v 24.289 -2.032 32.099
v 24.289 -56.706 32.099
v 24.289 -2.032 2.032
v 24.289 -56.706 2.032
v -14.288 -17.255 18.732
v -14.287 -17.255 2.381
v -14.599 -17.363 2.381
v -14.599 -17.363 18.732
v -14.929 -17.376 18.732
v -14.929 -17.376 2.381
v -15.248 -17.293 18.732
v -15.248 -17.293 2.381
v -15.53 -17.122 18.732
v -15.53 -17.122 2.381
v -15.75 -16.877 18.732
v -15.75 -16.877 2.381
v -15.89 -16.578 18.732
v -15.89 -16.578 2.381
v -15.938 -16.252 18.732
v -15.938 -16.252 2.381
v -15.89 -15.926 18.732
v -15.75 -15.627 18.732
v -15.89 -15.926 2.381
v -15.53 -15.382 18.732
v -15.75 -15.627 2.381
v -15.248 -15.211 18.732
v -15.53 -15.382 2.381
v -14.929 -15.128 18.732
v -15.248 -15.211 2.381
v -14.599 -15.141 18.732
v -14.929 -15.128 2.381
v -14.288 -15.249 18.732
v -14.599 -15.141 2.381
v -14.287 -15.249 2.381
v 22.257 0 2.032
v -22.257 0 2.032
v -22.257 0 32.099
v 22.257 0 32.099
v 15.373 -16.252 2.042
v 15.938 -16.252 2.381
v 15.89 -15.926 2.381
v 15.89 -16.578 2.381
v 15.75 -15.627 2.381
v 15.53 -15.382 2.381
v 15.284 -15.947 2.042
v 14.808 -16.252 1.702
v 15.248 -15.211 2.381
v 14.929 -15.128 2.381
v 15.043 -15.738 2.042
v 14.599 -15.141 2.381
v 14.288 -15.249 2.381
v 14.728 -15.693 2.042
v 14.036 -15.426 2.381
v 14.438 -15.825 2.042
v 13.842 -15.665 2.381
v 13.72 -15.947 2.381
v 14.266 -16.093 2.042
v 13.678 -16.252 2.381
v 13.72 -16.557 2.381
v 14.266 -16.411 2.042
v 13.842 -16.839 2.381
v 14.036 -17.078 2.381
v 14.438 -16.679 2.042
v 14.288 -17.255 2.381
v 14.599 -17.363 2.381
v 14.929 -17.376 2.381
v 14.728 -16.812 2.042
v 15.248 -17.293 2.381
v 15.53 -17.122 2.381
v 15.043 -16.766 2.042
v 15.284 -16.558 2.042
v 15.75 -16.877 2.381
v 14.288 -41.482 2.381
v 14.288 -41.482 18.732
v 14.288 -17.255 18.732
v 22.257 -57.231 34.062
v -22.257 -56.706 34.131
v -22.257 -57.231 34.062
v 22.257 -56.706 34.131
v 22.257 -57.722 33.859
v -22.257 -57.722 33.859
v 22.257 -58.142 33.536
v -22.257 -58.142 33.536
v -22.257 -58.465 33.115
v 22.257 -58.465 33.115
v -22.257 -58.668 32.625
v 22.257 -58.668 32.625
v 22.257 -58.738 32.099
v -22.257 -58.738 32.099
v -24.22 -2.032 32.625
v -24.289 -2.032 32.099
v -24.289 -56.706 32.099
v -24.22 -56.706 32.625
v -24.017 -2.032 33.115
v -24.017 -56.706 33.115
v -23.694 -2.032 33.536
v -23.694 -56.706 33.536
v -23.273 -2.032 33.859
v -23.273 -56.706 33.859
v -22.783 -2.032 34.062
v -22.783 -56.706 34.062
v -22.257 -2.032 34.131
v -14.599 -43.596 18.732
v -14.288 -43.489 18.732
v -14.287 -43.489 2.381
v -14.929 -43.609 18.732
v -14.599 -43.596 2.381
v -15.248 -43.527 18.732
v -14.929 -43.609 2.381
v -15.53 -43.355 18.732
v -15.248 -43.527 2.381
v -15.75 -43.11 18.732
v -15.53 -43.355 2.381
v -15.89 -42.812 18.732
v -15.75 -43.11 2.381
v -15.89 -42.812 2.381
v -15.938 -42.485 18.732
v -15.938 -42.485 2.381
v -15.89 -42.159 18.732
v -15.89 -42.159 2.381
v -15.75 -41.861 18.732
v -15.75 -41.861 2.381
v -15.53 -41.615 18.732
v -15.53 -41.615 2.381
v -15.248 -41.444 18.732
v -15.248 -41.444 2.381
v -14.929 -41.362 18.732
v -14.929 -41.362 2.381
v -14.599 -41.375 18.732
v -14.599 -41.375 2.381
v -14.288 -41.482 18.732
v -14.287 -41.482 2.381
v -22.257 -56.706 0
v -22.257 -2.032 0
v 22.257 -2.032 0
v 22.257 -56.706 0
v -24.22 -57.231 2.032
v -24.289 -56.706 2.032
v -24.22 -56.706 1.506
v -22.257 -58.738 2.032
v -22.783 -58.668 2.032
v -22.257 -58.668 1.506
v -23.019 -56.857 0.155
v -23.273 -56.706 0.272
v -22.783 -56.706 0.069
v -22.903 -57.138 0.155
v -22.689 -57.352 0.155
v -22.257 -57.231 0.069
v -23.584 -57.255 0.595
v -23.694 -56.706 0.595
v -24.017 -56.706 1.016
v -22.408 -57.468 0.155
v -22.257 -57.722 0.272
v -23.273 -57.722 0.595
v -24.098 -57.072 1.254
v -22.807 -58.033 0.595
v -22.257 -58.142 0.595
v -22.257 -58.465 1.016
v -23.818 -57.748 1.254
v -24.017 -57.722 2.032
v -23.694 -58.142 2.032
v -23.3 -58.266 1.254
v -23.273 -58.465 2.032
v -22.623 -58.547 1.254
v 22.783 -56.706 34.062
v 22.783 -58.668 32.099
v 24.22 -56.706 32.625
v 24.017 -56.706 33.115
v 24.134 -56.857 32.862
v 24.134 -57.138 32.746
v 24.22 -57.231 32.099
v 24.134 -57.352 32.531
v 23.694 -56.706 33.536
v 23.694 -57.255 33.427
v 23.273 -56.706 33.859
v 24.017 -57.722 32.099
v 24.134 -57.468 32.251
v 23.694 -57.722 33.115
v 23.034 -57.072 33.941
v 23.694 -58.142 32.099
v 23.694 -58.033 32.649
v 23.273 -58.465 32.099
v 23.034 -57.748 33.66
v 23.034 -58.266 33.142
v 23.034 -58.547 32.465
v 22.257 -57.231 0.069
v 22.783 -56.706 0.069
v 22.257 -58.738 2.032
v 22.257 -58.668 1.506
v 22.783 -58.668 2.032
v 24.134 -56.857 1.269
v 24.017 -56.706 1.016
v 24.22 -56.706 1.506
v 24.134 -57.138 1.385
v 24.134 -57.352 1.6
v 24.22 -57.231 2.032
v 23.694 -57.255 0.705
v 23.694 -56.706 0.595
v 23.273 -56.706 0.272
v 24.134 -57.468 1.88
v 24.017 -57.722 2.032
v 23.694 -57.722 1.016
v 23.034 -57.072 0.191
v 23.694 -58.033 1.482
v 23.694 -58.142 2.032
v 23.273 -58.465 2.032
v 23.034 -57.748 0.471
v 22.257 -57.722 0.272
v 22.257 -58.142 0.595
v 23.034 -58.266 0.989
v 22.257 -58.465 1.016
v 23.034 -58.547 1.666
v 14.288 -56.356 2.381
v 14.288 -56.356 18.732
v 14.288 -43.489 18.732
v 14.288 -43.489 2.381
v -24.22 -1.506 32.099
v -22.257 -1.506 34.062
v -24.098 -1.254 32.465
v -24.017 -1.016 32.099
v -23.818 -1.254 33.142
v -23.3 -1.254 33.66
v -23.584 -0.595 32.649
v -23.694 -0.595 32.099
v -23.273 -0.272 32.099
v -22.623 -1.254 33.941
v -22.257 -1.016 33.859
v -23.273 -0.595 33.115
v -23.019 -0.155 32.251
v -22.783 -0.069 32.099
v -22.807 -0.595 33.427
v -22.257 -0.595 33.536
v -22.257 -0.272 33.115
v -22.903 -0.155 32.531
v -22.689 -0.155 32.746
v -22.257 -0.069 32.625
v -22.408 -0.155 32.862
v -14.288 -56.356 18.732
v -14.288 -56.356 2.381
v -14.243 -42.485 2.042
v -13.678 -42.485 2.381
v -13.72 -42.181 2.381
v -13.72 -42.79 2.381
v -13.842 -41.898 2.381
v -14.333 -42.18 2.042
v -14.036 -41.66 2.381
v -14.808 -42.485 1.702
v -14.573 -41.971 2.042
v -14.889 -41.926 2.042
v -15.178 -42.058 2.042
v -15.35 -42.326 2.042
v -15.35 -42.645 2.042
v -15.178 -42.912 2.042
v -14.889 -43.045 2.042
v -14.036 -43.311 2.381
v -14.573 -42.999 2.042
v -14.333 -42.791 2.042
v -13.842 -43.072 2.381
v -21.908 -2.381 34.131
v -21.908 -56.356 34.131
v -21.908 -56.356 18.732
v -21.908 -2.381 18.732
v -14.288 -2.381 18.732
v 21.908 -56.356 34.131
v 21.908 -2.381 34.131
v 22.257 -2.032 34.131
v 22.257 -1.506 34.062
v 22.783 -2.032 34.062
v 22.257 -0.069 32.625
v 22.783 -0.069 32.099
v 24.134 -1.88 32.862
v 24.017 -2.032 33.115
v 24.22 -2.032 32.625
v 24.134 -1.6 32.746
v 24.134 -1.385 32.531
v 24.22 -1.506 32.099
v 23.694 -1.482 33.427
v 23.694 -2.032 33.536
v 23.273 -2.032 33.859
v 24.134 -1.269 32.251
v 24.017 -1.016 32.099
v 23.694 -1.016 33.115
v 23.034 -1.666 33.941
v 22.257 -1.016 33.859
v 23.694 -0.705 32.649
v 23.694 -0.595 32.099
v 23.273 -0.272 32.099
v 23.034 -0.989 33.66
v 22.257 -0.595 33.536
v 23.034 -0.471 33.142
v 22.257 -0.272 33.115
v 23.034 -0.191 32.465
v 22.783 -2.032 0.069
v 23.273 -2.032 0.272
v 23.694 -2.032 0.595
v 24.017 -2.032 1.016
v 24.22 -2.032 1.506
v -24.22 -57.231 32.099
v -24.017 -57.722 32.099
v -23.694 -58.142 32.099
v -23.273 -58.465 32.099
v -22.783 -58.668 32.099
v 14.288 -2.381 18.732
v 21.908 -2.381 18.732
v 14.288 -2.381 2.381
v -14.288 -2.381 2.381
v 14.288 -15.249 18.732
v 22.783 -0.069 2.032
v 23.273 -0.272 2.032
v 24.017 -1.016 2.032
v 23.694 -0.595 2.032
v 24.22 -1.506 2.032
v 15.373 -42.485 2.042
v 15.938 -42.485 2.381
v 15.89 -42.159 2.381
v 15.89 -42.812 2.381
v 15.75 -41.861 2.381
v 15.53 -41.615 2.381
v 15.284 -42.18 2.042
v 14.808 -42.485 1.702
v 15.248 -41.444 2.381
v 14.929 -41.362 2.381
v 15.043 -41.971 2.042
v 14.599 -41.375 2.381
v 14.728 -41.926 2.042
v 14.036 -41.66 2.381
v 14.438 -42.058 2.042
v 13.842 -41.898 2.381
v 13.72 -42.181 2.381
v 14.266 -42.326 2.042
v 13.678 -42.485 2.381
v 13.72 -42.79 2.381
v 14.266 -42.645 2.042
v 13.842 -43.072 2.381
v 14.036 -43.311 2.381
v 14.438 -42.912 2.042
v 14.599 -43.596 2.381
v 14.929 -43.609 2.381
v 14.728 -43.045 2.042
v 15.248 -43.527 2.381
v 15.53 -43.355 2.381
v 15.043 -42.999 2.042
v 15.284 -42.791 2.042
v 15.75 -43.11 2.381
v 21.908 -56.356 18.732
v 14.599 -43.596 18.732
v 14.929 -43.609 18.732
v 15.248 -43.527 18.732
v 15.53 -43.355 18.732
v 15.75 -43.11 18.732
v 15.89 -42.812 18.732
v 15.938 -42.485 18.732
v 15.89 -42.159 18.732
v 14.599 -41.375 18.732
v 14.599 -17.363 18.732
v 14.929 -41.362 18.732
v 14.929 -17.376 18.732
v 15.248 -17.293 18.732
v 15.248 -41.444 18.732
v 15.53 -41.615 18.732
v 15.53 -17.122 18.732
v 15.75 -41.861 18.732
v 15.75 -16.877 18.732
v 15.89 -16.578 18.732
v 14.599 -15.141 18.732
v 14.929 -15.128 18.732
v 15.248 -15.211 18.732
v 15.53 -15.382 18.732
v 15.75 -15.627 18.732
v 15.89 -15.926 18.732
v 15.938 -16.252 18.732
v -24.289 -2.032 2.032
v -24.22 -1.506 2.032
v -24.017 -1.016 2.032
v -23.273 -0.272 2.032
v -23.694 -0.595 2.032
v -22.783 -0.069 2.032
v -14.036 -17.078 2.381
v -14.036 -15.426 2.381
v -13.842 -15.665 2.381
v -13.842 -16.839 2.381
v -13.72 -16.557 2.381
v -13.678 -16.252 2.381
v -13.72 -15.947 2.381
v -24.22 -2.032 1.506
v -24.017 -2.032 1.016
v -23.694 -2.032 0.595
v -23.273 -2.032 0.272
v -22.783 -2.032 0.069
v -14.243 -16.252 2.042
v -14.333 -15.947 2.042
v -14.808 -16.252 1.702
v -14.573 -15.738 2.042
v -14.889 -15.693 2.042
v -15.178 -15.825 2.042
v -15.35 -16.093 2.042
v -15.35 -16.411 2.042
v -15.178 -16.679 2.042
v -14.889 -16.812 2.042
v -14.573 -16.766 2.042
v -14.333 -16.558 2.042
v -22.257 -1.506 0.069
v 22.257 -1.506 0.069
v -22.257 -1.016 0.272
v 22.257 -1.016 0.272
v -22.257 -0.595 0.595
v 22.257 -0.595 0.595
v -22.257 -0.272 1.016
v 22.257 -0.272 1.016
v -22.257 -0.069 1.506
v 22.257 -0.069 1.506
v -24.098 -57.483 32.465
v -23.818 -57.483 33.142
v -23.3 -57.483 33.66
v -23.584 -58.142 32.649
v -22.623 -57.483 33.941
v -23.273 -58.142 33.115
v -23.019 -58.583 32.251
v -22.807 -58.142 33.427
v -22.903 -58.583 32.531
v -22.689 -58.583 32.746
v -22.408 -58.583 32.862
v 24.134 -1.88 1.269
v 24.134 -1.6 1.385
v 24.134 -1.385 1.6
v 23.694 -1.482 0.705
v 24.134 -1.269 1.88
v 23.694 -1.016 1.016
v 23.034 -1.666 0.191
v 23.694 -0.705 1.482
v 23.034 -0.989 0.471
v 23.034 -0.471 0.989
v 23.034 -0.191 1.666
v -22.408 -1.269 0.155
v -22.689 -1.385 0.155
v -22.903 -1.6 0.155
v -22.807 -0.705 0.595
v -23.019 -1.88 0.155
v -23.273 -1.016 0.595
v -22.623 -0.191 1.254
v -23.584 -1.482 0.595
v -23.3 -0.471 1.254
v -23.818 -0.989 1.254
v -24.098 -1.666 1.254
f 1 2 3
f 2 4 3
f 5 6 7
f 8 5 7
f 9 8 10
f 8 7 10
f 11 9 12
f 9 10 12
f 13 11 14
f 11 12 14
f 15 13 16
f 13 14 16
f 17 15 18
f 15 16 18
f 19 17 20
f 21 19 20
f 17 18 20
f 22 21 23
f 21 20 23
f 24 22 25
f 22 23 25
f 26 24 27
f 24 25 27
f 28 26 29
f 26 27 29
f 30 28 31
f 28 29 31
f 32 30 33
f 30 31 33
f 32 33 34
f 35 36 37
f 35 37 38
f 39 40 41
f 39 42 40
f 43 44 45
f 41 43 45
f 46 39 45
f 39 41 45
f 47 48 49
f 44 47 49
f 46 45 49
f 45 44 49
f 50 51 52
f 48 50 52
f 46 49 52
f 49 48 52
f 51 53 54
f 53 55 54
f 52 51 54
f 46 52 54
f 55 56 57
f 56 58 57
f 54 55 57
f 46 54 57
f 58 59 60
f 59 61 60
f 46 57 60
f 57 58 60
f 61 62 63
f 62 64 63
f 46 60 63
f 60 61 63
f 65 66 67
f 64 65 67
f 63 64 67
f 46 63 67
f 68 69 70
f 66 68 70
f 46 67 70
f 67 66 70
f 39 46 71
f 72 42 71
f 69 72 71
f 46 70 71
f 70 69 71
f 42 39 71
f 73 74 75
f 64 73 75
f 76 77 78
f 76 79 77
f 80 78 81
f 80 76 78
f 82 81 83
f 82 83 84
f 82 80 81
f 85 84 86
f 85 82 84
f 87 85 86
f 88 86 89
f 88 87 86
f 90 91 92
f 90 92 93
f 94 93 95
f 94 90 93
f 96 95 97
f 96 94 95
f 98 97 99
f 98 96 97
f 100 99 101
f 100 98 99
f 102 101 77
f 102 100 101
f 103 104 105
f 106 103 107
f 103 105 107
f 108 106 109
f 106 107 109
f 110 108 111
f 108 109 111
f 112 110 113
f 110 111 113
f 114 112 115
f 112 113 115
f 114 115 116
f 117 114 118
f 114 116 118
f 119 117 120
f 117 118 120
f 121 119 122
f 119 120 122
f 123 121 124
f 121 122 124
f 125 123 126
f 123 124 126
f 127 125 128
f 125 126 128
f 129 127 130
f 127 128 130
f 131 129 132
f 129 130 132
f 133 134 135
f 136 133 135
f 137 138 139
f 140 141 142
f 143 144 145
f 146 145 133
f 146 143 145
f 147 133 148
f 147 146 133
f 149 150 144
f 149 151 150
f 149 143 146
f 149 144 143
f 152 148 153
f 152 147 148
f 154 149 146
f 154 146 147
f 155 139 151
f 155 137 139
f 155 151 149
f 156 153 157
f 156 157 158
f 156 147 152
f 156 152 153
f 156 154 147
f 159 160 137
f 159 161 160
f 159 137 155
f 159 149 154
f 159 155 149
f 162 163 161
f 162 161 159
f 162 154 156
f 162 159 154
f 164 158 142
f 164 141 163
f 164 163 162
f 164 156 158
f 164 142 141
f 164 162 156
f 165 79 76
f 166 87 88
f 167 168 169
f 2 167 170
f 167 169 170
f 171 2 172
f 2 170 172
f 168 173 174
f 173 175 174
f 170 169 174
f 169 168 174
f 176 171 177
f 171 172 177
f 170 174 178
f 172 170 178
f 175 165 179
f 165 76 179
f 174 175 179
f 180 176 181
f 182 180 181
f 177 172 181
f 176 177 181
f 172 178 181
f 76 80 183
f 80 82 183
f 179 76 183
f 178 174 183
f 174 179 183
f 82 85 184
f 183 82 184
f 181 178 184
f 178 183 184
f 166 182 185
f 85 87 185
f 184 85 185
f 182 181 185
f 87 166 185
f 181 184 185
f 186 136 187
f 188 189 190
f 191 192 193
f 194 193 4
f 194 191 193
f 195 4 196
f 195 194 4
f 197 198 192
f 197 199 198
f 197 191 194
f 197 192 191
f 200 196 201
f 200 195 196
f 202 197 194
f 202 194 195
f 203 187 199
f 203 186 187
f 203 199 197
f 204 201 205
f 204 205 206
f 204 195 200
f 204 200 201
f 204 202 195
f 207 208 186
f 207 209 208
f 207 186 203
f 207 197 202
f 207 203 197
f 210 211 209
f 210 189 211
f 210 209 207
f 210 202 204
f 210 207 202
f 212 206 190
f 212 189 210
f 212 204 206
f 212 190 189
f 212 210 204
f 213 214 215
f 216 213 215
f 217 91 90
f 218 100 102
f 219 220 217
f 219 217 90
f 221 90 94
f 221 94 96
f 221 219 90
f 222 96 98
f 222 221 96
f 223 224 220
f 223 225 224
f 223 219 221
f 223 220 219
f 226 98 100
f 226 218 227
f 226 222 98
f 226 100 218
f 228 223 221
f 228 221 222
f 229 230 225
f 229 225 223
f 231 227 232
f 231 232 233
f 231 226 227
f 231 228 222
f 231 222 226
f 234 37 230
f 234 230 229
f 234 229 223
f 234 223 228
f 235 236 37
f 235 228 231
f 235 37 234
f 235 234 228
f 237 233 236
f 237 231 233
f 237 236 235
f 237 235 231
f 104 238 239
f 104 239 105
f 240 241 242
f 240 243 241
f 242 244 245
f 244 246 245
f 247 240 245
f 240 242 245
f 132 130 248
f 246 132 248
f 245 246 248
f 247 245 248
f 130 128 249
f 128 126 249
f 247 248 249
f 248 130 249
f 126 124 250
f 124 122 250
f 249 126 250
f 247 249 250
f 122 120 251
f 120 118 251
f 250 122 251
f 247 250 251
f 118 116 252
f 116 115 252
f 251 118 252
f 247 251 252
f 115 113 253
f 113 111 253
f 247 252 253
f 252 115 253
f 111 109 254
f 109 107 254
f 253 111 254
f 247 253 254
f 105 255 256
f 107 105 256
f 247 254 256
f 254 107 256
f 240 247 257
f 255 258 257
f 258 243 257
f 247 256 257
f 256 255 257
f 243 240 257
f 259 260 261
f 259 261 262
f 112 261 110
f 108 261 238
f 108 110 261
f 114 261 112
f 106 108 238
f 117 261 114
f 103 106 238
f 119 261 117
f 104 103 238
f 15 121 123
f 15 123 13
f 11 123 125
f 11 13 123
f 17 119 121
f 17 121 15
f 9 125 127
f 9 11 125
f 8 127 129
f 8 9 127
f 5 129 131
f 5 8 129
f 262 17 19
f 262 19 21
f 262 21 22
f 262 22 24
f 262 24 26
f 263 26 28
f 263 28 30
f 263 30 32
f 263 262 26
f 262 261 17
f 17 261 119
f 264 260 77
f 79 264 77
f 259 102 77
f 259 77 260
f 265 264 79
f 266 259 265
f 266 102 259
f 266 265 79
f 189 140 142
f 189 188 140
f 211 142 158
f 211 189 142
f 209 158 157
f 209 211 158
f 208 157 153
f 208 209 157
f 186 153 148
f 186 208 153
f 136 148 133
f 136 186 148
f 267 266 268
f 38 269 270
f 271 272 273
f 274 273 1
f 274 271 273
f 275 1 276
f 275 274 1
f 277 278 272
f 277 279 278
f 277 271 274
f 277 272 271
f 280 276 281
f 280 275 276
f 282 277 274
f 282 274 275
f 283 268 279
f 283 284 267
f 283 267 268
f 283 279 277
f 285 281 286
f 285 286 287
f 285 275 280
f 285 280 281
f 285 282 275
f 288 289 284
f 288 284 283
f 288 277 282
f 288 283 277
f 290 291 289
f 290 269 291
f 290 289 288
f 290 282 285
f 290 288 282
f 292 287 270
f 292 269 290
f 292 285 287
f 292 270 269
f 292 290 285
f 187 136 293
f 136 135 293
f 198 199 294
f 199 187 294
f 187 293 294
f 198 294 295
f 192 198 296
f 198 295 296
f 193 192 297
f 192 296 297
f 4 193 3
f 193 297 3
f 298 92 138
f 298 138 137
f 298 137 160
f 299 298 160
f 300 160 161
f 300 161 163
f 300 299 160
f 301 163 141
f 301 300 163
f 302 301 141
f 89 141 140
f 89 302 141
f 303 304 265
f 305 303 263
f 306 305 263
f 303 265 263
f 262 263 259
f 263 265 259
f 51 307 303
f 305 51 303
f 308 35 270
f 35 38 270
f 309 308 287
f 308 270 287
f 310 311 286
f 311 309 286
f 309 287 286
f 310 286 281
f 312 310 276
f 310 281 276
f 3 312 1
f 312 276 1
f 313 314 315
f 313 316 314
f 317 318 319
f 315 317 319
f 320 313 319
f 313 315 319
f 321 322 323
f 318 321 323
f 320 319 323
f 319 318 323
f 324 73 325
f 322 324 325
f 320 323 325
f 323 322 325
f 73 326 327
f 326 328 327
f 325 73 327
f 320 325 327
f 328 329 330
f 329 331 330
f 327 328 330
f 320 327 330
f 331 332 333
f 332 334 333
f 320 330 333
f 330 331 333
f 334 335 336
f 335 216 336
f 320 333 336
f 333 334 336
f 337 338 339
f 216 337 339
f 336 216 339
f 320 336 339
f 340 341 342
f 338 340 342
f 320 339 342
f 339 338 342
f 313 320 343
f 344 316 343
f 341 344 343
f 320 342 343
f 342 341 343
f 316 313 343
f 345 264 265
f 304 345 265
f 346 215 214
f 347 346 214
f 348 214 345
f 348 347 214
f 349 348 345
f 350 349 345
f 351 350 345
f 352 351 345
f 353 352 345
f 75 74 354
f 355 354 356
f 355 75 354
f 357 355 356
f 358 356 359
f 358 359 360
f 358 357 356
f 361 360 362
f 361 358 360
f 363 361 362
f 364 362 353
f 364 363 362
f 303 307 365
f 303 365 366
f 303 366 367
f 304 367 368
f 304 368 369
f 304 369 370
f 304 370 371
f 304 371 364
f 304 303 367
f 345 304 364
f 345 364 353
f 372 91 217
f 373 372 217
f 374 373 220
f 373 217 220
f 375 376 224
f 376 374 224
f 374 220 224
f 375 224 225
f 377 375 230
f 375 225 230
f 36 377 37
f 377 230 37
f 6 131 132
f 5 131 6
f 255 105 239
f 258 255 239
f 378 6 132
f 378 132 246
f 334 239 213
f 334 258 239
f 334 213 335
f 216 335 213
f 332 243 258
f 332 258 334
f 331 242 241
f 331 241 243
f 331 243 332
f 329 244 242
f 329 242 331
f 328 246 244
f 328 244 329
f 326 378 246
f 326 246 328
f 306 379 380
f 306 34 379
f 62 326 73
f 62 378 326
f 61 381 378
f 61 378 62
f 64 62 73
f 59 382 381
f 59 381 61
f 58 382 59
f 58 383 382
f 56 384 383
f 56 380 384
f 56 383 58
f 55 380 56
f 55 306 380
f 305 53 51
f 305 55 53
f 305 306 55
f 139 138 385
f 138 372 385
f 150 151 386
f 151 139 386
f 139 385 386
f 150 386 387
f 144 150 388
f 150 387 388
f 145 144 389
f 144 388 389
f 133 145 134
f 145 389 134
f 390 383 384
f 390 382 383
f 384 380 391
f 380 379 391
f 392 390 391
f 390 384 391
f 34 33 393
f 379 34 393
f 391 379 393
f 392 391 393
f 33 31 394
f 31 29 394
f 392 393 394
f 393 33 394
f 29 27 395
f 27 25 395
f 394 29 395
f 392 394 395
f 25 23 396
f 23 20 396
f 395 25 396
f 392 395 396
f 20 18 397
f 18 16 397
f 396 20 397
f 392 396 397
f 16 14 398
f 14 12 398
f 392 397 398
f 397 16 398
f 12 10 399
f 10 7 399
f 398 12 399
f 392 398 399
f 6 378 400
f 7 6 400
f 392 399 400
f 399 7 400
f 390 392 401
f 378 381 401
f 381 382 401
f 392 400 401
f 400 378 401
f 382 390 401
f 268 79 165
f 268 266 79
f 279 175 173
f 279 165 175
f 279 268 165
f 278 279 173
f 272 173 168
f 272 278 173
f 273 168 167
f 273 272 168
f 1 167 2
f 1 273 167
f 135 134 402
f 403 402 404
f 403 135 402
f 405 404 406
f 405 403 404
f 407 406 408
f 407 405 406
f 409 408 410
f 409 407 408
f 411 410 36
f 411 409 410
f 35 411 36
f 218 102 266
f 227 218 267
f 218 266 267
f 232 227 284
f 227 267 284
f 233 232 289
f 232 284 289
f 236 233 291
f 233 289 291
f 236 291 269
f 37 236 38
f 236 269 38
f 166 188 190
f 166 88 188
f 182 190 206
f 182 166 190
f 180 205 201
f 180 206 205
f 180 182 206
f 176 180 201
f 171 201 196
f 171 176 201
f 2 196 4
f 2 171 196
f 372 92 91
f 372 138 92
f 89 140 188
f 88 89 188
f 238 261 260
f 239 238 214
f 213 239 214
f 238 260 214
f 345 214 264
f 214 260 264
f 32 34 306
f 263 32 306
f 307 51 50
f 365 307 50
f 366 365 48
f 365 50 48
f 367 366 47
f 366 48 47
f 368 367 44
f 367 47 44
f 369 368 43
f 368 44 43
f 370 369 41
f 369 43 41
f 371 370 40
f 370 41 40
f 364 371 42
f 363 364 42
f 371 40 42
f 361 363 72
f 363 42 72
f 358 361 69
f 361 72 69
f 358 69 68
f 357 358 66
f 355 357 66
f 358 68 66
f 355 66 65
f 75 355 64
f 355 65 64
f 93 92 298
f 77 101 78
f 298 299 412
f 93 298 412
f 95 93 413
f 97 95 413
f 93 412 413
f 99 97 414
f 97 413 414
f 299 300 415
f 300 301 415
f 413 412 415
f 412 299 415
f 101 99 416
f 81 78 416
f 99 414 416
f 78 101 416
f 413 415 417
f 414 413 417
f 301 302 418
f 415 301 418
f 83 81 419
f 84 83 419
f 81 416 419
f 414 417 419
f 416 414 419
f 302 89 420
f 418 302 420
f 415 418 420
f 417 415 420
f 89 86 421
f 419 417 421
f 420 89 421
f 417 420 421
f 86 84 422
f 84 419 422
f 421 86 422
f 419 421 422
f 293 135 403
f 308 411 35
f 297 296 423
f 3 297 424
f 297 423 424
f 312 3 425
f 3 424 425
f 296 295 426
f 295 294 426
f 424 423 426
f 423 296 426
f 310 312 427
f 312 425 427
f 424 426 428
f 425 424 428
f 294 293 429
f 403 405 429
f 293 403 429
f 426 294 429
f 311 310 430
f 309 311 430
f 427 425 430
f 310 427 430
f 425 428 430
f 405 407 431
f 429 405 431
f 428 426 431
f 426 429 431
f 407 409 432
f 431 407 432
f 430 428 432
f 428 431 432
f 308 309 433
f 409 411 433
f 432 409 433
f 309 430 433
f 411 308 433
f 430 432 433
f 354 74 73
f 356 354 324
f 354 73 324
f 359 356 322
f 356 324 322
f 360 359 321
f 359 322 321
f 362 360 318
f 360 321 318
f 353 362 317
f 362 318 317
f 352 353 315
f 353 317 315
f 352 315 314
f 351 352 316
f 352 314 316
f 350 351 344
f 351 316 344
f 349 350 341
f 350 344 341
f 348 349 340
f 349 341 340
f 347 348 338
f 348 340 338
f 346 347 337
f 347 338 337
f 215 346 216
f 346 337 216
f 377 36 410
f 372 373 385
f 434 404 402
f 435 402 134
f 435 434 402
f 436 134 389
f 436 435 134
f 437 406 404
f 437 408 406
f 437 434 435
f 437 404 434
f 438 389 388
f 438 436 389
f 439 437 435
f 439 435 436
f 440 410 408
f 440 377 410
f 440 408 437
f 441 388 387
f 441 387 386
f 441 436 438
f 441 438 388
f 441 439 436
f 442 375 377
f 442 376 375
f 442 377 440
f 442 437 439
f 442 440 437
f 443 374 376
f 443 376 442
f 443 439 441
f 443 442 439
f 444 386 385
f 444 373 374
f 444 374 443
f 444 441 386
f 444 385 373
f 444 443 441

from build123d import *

# Parameters (mm, degrees)
SKETCH1_W                 = 48.5775
SKETCH1_H                 = 58.7375
BOSS_EXTRUDE1_DEPTH       = 34.13125
SKETCH2_W                 = 21.9075
SKETCH2_H                 = 53.975
CUT_EXTRUDE1_DEPTH        = 2.38125
SKETCH4_W                 = 14.2875
SKETCH4_H                 = 53.975
CUT_EXTRUDE2_DEPTH        = 29.36875
SKETCH5_W                 = 7.62
SKETCH5_H                 = 53.975
CUT_EXTRUDE3_DEPTH        = 13.0175
F_4_40_TAPPED_HOLE1_D     = 2.2606
F_4_40_TAPPED_HOLE1_DEPTH = 16.35125
F_4_40_TAPPED_HOLE1_TIP   = 0.679152758
FILLET3_R                 = 2.032
FILLET4_R                 = 2.032


with BuildPart() as part:
    # Sketch1 → Boss-Extrude1 (new body)
    with BuildSketch(Plane.XY):
        with Locations((0, -29.36875)):
            Rectangle(SKETCH1_W, SKETCH1_H)
    extrude(amount=BOSS_EXTRUDE1_DEPTH)

    # Sketch2 → Cut-Extrude1 (cut)
    with BuildSketch(Plane.XY.offset(34.13125)):
        with Locations((10.95375, -29.36875)):
            Rectangle(SKETCH2_W, SKETCH2_H)
        with Locations((-10.95375, -29.36875)):
            Rectangle(SKETCH2_W, SKETCH2_H)
    extrude(amount=-CUT_EXTRUDE1_DEPTH, mode=Mode.SUBTRACT)

    # Sketch4 → Cut-Extrude2 (cut)
    with BuildSketch(Plane.XY.offset(31.75)):
        with Locations((7.14375, -29.36875)):
            Rectangle(SKETCH4_W, SKETCH4_H)
        with Locations((-7.14375, -29.36875)):
            Rectangle(SKETCH4_W, SKETCH4_H)
    extrude(amount=-CUT_EXTRUDE2_DEPTH, mode=Mode.SUBTRACT)

    # Sketch5 → Cut-Extrude3 (cut)
    with BuildSketch(Plane.XY.offset(31.75)):
        with Locations((-18.0975, -29.36875)):
            Rectangle(SKETCH5_W, SKETCH5_H)
        with Locations((18.0975, -29.36875)):
            Rectangle(SKETCH5_W, SKETCH5_H)
    extrude(amount=-CUT_EXTRUDE3_DEPTH, mode=Mode.SUBTRACT)

    # #4-40 Tapped Hole1
    with Locations(Plane.XY.offset(18.7325)):
        with Locations((-14.8082, -16.2521392), (-14.8082, -42.4853608), (14.8082, -42.4853608), (14.8082, -16.2521392)):
            Hole(F_4_40_TAPPED_HOLE1_D / 2, depth=F_4_40_TAPPED_HOLE1_DEPTH)
            with Locations((0, 0, -(F_4_40_TAPPED_HOLE1_DEPTH + F_4_40_TAPPED_HOLE1_TIP / 2))):  # 118° drill point
                Cone(0, F_4_40_TAPPED_HOLE1_D / 2, F_4_40_TAPPED_HOLE1_TIP, mode=Mode.SUBTRACT)

    # Fillet3
    fillet3_edges = [part.edges().sort_by_distance(p)[0] for p in [
        (-24.28875, -29.36875, 34.13125),
    ]]
    fillet(fillet3_edges, radius=FILLET3_R)

    # Fillet4
    fillet4_edges = [part.edges().sort_by_distance(p)[0] for p in [
        (-24.28875, -58.7375, 16.049625),
        (-23.693590979, -58.7375, 33.536090979),
        (-24.28875, 0, 16.049625),
        (-23.693590979, 0, 33.536090979),
        (1.016, 0, 34.13125),
        (24.28875, -29.36875, 34.13125),
        (0, 0, 0),
        (-24.28875, -29.36875, 0),
        (0, -58.7375, 0),
        (24.28875, -29.36875, 0),
        (1.016, -58.7375, 34.13125),
        (24.28875, 0, 17.065625),
        (24.28875, -58.7375, 17.065625),
    ]]
    fillet(fillet4_edges, radius=FILLET4_R)


solid = part.part
